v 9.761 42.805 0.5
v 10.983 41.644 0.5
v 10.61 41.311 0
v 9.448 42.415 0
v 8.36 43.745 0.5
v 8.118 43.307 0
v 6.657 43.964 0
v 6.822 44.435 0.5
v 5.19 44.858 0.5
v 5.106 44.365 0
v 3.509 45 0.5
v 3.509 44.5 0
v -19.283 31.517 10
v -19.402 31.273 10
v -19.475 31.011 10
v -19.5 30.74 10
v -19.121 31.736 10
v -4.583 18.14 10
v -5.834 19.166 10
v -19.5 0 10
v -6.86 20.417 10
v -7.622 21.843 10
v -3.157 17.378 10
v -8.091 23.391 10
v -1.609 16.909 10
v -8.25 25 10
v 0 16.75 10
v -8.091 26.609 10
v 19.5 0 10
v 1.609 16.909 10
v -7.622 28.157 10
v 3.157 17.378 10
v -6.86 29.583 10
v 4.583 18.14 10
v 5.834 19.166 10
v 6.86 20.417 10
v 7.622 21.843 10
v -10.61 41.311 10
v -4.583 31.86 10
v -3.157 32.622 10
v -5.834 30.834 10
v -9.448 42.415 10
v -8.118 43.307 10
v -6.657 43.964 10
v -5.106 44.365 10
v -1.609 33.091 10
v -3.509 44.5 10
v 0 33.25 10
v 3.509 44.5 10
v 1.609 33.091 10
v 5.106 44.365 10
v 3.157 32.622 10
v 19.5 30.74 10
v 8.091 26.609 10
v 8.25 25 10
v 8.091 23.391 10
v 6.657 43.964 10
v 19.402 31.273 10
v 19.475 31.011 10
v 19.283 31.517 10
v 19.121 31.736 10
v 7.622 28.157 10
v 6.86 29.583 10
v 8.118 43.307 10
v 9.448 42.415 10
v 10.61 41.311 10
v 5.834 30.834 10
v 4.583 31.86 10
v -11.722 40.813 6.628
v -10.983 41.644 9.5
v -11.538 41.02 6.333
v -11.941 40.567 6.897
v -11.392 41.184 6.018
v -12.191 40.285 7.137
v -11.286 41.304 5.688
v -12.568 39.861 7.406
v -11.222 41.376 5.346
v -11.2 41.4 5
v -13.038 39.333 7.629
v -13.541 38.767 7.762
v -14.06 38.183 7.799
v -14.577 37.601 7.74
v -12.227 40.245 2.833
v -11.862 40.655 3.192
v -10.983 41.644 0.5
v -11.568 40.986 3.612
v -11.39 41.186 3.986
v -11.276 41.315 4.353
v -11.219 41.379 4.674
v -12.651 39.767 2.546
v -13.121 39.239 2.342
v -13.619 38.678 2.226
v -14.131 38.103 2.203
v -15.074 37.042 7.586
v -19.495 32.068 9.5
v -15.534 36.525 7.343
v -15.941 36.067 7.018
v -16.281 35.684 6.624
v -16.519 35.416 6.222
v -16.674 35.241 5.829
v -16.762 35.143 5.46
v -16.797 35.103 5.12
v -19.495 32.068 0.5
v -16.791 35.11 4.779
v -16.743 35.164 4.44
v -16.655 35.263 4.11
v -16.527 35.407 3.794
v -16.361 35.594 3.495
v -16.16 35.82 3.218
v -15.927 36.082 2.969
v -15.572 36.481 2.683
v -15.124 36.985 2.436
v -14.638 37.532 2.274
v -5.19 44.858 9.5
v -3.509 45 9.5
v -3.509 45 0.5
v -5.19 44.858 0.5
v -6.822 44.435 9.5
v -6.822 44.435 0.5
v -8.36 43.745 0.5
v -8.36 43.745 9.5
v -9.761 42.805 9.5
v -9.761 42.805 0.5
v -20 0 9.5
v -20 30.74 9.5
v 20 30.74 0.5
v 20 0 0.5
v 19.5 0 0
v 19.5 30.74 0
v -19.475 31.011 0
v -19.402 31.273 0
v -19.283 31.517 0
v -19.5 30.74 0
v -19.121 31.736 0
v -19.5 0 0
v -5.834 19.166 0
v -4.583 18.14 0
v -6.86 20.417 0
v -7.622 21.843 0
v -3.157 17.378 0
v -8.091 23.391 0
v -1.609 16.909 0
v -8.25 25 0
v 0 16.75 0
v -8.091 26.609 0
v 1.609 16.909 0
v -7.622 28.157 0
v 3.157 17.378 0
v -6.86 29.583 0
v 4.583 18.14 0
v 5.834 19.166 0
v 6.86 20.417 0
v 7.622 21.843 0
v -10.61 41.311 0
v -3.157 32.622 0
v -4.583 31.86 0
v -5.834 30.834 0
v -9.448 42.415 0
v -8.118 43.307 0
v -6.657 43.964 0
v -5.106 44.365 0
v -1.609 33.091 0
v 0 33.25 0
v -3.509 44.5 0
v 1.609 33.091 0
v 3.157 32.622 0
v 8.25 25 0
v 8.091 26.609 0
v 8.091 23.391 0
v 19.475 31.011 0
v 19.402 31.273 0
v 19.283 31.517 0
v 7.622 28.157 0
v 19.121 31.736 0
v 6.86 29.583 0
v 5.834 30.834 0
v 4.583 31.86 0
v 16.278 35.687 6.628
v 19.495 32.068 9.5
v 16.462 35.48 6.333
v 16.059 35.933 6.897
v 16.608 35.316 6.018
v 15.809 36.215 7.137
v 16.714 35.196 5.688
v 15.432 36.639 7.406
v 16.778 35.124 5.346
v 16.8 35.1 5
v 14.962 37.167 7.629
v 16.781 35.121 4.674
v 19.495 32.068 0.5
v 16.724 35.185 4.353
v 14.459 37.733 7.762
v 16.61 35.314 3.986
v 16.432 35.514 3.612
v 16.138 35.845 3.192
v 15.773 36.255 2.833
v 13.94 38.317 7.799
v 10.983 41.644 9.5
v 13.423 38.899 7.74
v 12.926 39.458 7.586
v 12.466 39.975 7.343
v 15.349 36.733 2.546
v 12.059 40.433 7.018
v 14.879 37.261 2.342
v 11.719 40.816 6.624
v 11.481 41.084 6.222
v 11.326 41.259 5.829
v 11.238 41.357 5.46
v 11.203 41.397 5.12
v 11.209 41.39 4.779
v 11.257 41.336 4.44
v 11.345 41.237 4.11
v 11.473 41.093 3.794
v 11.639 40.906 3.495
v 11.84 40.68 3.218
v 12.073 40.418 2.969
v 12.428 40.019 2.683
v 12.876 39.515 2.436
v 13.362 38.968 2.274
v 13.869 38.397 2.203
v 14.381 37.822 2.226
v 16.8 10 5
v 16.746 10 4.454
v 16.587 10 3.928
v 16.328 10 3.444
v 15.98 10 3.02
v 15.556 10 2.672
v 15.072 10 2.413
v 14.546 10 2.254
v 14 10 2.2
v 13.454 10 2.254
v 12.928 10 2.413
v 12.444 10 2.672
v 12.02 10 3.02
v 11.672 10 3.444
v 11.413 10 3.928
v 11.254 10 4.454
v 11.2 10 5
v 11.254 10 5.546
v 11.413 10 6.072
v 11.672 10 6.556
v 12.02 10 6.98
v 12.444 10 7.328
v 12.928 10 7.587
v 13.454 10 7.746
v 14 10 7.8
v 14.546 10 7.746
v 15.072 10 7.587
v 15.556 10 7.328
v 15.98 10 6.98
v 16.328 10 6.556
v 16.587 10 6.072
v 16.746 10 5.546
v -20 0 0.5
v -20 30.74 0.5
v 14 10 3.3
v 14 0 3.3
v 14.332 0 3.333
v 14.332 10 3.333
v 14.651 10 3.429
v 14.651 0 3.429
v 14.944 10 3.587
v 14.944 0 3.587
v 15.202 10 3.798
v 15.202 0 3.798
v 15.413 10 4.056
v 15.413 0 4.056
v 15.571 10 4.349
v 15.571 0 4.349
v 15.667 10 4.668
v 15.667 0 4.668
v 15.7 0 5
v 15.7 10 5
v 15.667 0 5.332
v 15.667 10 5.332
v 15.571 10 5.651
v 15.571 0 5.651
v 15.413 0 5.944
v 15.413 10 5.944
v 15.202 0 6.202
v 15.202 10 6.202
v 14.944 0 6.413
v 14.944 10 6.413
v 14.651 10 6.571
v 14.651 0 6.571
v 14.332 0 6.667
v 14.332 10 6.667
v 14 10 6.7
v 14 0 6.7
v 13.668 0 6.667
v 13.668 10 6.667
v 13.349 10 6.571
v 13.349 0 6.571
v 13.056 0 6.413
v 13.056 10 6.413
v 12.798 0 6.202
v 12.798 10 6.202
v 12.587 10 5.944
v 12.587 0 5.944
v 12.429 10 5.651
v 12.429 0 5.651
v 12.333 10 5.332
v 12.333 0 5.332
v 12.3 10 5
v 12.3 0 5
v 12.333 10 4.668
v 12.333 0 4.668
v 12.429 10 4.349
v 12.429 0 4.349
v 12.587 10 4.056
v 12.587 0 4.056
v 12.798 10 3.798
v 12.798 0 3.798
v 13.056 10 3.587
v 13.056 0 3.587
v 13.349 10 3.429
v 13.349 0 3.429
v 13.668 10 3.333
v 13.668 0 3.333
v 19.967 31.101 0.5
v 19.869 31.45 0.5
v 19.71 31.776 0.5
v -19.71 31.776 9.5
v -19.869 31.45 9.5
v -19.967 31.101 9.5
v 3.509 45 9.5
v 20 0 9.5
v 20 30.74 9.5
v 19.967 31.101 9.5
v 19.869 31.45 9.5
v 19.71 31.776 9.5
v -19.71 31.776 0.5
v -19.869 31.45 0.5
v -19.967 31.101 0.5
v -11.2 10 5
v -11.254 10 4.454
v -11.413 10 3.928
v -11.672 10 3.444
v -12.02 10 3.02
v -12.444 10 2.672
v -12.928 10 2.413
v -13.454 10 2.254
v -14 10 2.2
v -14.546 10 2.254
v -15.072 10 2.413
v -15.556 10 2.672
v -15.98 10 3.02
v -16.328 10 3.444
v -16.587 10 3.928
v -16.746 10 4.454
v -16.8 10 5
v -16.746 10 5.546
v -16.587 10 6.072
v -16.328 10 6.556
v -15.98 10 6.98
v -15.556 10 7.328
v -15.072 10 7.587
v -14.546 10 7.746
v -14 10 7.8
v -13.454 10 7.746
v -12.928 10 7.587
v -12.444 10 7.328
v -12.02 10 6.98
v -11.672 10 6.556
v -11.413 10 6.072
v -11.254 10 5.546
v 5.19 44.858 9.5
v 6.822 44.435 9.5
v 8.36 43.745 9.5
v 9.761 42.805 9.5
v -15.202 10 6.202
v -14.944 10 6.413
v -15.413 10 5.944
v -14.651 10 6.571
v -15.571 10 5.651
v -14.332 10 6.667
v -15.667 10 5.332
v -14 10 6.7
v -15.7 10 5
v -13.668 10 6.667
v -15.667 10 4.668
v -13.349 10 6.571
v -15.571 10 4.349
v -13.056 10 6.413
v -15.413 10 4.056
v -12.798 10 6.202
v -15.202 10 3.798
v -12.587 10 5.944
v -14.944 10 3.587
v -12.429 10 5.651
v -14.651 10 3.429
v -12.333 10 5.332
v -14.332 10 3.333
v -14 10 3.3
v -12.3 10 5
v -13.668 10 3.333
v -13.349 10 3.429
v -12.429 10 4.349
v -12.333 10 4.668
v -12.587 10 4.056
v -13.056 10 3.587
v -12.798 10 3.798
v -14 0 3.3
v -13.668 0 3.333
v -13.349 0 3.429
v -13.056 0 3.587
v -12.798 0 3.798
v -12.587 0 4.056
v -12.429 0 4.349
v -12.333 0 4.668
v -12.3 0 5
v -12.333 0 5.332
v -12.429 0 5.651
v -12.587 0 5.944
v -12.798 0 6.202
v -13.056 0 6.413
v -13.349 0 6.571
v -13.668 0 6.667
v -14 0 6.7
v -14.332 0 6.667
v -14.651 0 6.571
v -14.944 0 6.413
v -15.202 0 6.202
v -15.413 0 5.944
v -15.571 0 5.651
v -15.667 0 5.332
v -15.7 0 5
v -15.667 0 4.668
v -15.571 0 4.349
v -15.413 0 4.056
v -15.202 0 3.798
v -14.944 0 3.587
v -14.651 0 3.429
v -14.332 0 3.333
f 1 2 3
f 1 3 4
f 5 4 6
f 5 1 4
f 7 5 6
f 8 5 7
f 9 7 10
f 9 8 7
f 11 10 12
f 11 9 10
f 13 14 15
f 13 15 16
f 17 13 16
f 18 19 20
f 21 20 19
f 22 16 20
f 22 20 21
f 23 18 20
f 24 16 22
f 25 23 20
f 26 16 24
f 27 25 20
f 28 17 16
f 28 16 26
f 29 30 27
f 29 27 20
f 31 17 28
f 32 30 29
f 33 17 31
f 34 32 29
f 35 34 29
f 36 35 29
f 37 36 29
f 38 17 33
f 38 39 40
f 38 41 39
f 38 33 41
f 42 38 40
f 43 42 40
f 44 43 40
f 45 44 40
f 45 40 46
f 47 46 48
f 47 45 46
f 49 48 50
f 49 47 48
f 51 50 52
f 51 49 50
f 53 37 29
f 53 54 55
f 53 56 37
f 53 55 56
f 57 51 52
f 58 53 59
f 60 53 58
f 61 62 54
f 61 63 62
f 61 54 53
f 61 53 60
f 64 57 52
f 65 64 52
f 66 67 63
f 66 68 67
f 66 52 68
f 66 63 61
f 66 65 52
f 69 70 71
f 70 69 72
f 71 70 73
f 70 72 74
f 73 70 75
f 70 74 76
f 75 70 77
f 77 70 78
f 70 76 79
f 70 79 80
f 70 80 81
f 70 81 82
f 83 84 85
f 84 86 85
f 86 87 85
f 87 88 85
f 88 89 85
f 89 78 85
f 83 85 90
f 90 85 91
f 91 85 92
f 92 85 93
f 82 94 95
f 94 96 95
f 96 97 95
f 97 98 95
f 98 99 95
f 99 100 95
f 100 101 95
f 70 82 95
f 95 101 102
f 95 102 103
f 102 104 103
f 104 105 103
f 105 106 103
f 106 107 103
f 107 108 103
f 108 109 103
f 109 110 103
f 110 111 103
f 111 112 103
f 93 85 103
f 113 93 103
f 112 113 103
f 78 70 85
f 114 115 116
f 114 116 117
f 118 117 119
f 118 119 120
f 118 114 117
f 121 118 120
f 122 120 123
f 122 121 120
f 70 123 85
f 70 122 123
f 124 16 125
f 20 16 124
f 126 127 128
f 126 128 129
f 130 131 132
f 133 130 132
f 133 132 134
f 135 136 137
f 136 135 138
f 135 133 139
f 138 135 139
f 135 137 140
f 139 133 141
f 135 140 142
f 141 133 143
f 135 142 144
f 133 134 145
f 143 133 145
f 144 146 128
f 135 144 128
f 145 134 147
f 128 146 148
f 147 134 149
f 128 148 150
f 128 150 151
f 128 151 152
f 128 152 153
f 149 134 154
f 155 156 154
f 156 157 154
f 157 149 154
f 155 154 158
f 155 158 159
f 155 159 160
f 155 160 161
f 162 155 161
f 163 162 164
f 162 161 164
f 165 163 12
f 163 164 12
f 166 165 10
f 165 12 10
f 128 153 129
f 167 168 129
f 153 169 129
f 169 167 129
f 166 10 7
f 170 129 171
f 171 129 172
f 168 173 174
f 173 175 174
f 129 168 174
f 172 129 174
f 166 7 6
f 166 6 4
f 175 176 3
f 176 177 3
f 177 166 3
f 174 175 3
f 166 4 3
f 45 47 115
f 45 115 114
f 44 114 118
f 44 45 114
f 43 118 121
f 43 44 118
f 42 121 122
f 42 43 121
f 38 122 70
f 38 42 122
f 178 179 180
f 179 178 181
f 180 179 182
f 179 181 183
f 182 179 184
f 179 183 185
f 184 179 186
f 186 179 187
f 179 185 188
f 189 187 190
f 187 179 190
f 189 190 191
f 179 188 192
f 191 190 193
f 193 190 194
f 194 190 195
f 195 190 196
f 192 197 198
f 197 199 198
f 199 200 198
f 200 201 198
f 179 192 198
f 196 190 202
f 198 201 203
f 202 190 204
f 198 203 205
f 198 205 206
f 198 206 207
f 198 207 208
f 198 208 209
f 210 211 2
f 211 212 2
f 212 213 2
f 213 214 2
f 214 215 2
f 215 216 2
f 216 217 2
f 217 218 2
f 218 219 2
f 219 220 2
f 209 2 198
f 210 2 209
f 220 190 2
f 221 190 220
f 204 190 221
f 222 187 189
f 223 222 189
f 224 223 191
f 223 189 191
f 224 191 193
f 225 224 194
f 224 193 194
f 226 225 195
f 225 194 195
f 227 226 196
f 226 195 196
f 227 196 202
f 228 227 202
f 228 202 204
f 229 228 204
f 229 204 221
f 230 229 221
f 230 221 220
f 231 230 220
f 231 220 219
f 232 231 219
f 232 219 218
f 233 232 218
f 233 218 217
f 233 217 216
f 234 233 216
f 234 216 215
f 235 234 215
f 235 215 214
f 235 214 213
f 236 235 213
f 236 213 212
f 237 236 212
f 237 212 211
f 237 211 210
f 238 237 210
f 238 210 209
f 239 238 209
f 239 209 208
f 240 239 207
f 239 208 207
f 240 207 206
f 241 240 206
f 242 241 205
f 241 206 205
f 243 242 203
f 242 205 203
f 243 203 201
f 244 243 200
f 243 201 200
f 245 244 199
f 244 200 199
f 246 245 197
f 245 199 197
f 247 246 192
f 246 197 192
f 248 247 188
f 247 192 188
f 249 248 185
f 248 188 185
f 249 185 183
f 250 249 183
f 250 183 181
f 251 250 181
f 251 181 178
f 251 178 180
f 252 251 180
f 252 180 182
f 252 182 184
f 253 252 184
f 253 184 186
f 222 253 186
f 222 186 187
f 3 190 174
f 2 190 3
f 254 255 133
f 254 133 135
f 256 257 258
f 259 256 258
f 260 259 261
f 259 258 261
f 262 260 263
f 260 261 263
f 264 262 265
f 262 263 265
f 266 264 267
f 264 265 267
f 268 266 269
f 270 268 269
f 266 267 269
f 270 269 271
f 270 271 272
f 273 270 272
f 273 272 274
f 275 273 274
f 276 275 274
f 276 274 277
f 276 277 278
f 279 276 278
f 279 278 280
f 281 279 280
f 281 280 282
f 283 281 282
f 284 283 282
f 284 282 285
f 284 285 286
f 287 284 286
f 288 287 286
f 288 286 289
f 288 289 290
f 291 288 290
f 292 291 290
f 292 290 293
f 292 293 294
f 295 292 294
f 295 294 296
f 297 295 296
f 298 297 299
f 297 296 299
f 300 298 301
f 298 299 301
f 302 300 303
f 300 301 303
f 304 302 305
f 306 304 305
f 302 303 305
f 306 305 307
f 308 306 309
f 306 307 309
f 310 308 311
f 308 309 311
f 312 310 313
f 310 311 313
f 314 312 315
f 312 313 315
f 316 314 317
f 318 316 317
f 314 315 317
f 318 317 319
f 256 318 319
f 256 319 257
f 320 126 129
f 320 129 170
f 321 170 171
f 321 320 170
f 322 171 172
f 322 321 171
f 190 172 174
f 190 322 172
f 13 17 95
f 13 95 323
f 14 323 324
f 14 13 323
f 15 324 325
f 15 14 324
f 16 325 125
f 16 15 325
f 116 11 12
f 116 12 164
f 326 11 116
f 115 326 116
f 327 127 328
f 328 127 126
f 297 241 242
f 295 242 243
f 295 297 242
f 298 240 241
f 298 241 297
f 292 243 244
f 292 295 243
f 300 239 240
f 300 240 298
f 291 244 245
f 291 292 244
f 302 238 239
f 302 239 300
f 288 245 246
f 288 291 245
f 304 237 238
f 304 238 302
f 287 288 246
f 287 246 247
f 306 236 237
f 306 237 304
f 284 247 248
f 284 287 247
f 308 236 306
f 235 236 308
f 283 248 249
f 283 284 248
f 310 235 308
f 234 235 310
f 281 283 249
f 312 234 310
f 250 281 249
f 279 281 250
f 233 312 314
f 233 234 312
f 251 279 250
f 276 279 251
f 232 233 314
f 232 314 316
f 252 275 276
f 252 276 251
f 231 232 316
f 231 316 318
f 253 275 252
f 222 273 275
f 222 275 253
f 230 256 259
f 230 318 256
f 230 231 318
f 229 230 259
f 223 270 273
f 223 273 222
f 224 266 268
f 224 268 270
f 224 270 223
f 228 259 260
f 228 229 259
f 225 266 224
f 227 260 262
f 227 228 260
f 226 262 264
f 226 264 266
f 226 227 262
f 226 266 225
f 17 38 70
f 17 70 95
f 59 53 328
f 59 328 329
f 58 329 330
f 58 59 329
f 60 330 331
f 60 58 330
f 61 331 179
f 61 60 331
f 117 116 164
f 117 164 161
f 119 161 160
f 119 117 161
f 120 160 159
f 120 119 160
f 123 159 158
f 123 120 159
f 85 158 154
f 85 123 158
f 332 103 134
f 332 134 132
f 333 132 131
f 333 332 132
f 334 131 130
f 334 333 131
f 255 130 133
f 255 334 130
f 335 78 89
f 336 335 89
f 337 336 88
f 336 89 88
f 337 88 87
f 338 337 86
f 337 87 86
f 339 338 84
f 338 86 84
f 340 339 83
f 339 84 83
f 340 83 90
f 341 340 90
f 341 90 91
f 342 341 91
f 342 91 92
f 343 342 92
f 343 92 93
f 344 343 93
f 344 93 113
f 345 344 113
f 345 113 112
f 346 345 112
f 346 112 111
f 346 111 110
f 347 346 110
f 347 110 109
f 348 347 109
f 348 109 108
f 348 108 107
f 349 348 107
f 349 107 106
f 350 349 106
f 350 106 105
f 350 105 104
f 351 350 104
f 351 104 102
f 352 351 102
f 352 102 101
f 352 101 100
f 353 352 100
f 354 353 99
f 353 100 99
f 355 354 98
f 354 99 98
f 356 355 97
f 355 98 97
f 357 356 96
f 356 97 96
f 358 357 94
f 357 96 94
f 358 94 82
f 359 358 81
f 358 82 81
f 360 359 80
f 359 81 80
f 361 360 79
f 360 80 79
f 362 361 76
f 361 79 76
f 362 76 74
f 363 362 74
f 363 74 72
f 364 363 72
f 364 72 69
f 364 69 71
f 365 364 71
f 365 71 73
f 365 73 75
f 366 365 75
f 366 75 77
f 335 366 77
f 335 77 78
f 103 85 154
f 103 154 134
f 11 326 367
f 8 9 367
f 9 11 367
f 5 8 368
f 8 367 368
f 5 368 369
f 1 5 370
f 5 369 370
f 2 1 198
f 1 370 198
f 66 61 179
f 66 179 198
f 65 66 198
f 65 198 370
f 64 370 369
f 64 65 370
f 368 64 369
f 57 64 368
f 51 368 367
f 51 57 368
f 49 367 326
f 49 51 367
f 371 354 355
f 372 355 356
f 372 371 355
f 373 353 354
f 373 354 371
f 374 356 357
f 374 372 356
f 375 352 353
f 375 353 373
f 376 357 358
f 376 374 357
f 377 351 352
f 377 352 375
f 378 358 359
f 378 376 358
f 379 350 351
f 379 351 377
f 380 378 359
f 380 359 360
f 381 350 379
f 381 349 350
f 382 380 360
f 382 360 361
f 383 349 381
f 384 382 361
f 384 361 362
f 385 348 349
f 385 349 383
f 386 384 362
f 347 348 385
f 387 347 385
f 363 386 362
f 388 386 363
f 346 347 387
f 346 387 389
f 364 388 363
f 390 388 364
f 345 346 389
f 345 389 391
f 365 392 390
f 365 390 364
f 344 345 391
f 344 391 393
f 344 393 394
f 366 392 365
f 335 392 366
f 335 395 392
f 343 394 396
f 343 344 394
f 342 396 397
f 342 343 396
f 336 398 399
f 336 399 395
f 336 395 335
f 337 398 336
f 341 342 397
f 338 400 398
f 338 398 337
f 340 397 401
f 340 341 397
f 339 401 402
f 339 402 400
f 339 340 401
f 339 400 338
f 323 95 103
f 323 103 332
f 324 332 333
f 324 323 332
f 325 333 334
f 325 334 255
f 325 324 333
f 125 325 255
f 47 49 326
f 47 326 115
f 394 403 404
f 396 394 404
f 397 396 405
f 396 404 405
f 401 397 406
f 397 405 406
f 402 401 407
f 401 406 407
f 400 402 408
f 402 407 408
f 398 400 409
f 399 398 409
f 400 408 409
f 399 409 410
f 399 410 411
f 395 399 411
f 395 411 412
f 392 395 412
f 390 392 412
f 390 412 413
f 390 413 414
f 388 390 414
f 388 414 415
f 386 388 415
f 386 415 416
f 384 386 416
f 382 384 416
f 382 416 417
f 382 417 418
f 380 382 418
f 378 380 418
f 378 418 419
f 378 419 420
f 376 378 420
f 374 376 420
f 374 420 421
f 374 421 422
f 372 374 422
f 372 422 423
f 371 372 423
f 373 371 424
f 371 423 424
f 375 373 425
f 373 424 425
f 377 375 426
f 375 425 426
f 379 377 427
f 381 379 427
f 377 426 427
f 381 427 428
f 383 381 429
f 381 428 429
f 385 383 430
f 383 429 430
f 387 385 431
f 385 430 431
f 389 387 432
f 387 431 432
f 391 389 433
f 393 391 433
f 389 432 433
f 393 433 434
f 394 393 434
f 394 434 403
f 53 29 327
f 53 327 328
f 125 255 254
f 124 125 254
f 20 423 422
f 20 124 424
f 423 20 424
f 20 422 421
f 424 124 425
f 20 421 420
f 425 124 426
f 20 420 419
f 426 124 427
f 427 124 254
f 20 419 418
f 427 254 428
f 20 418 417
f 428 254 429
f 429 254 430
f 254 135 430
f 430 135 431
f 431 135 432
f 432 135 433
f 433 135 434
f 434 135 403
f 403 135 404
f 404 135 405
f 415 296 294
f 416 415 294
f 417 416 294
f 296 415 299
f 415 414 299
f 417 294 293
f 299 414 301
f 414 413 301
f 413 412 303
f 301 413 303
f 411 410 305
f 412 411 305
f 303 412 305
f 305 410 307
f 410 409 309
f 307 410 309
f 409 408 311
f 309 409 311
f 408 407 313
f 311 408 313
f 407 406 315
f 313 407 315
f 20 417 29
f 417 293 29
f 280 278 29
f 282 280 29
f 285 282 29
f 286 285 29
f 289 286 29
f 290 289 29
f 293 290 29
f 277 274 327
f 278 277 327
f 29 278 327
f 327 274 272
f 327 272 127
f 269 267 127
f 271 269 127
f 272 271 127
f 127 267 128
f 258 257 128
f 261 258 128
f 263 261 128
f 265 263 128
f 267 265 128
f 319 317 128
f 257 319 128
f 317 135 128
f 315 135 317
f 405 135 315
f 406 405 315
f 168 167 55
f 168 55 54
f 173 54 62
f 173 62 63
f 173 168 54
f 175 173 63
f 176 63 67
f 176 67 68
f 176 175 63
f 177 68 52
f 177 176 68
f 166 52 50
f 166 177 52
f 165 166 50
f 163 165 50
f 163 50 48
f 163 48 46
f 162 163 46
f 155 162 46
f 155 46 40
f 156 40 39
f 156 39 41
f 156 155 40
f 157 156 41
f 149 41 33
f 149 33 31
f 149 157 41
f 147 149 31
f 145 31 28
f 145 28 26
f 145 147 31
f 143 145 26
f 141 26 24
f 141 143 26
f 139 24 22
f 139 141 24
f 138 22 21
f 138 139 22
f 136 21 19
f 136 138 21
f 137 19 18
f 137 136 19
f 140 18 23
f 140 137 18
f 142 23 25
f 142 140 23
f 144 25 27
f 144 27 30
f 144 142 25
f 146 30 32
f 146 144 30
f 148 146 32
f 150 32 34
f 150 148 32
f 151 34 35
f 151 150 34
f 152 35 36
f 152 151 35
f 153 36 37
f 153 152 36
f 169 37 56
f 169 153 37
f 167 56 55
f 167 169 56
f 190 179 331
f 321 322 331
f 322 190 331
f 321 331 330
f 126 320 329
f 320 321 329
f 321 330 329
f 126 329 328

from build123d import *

# Parameters (mm, degrees)
SKETCH1_R            = 8.25
BOSS_EXTRUDE1_DEPTH  = 10
M3_CLEARANCE_HOLE1_D = 3.4
SKETCH2_R            = 2.8
CUT_EXTRUDE1_DEPTH   = 35
FILLET1_R            = 10
FILLET2_R            = 2
CHAMFER1_SIZE        = 0.5


with BuildPart() as part:
    # Sketch1 → Boss-Extrude1 (new body)
    with BuildSketch(Plane.XY):
        Polygon((8, 45), (-8, 45), (-20, 31.5), (-20, 0), (20, 0), (20, 31.5), align=None)
        with Locations((0, 25)):
            Circle(SKETCH1_R, mode=Mode.SUBTRACT)
    extrude(amount=BOSS_EXTRUDE1_DEPTH)

    # M3 Clearance Hole1 (through all)
    with Locations(Plane(origin=(-14, 45, 5), x_dir=(0, 0, 1), z_dir=(0, 1, 0))):
        with Locations((0, 0), (0, 28)):
            Hole(M3_CLEARANCE_HOLE1_D / 2)

    # Sketch2 → Cut-Extrude1 (cut)
    with BuildSketch(Plane(origin=(0, 45, 0), x_dir=(1, 0, 0), z_dir=(0, 1, 0))):
        with Locations((14, -5)):
            Circle(SKETCH2_R)
        with Locations((-14, -5)):
            Circle(SKETCH2_R)
    extrude(amount=-CUT_EXTRUDE1_DEPTH, mode=Mode.SUBTRACT)

    # Fillet1
    fillet1_edges = [part.edges().sort_by_distance(p)[0] for p in [
        (-8, 45, 5),
        (8, 45, 5),
    ]]
    fillet(fillet1_edges, radius=FILLET1_R)

    # Fillet2
    fillet2_edges = [part.edges().sort_by_distance(p)[0] for p in [
        (-20, 31.5, 5),
        (20, 31.5, 5),
    ]]
    fillet(fillet2_edges, radius=FILLET2_R)

    # Chamfer1
    chamfer1_edges = [part.edges().sort_by_distance(p)[0] for p in [
        (-15.239125591, 36.855983711, 0),
        (-15.239125591, 36.855983711, 10),
        (0, 45, 0),
        (15.239125591, 36.855983711, 0),
        (7.605899873, 44.122400558, 0),
        (-7.605899873, 44.122400558, 0),
        (0, 45, 10),
        (15.239125591, 36.855983711, 10),
        (7.605899873, 44.122400558, 10),
        (-7.605899873, 44.122400558, 10),
        (-20, 15.369800678, 0),
        (-20, 15.369800678, 10),
        (20, 15.369800678, 0),
        (19.869443403, 31.45036247, 0),
        (-19.869443403, 31.45036247, 0),
        (20, 15.369800678, 10),
        (19.869443403, 31.45036247, 10),
        (-19.869443403, 31.45036247, 10),
    ]]
    chamfer(chamfer1_edges, length=CHAMFER1_SIZE)


solid = part.part
